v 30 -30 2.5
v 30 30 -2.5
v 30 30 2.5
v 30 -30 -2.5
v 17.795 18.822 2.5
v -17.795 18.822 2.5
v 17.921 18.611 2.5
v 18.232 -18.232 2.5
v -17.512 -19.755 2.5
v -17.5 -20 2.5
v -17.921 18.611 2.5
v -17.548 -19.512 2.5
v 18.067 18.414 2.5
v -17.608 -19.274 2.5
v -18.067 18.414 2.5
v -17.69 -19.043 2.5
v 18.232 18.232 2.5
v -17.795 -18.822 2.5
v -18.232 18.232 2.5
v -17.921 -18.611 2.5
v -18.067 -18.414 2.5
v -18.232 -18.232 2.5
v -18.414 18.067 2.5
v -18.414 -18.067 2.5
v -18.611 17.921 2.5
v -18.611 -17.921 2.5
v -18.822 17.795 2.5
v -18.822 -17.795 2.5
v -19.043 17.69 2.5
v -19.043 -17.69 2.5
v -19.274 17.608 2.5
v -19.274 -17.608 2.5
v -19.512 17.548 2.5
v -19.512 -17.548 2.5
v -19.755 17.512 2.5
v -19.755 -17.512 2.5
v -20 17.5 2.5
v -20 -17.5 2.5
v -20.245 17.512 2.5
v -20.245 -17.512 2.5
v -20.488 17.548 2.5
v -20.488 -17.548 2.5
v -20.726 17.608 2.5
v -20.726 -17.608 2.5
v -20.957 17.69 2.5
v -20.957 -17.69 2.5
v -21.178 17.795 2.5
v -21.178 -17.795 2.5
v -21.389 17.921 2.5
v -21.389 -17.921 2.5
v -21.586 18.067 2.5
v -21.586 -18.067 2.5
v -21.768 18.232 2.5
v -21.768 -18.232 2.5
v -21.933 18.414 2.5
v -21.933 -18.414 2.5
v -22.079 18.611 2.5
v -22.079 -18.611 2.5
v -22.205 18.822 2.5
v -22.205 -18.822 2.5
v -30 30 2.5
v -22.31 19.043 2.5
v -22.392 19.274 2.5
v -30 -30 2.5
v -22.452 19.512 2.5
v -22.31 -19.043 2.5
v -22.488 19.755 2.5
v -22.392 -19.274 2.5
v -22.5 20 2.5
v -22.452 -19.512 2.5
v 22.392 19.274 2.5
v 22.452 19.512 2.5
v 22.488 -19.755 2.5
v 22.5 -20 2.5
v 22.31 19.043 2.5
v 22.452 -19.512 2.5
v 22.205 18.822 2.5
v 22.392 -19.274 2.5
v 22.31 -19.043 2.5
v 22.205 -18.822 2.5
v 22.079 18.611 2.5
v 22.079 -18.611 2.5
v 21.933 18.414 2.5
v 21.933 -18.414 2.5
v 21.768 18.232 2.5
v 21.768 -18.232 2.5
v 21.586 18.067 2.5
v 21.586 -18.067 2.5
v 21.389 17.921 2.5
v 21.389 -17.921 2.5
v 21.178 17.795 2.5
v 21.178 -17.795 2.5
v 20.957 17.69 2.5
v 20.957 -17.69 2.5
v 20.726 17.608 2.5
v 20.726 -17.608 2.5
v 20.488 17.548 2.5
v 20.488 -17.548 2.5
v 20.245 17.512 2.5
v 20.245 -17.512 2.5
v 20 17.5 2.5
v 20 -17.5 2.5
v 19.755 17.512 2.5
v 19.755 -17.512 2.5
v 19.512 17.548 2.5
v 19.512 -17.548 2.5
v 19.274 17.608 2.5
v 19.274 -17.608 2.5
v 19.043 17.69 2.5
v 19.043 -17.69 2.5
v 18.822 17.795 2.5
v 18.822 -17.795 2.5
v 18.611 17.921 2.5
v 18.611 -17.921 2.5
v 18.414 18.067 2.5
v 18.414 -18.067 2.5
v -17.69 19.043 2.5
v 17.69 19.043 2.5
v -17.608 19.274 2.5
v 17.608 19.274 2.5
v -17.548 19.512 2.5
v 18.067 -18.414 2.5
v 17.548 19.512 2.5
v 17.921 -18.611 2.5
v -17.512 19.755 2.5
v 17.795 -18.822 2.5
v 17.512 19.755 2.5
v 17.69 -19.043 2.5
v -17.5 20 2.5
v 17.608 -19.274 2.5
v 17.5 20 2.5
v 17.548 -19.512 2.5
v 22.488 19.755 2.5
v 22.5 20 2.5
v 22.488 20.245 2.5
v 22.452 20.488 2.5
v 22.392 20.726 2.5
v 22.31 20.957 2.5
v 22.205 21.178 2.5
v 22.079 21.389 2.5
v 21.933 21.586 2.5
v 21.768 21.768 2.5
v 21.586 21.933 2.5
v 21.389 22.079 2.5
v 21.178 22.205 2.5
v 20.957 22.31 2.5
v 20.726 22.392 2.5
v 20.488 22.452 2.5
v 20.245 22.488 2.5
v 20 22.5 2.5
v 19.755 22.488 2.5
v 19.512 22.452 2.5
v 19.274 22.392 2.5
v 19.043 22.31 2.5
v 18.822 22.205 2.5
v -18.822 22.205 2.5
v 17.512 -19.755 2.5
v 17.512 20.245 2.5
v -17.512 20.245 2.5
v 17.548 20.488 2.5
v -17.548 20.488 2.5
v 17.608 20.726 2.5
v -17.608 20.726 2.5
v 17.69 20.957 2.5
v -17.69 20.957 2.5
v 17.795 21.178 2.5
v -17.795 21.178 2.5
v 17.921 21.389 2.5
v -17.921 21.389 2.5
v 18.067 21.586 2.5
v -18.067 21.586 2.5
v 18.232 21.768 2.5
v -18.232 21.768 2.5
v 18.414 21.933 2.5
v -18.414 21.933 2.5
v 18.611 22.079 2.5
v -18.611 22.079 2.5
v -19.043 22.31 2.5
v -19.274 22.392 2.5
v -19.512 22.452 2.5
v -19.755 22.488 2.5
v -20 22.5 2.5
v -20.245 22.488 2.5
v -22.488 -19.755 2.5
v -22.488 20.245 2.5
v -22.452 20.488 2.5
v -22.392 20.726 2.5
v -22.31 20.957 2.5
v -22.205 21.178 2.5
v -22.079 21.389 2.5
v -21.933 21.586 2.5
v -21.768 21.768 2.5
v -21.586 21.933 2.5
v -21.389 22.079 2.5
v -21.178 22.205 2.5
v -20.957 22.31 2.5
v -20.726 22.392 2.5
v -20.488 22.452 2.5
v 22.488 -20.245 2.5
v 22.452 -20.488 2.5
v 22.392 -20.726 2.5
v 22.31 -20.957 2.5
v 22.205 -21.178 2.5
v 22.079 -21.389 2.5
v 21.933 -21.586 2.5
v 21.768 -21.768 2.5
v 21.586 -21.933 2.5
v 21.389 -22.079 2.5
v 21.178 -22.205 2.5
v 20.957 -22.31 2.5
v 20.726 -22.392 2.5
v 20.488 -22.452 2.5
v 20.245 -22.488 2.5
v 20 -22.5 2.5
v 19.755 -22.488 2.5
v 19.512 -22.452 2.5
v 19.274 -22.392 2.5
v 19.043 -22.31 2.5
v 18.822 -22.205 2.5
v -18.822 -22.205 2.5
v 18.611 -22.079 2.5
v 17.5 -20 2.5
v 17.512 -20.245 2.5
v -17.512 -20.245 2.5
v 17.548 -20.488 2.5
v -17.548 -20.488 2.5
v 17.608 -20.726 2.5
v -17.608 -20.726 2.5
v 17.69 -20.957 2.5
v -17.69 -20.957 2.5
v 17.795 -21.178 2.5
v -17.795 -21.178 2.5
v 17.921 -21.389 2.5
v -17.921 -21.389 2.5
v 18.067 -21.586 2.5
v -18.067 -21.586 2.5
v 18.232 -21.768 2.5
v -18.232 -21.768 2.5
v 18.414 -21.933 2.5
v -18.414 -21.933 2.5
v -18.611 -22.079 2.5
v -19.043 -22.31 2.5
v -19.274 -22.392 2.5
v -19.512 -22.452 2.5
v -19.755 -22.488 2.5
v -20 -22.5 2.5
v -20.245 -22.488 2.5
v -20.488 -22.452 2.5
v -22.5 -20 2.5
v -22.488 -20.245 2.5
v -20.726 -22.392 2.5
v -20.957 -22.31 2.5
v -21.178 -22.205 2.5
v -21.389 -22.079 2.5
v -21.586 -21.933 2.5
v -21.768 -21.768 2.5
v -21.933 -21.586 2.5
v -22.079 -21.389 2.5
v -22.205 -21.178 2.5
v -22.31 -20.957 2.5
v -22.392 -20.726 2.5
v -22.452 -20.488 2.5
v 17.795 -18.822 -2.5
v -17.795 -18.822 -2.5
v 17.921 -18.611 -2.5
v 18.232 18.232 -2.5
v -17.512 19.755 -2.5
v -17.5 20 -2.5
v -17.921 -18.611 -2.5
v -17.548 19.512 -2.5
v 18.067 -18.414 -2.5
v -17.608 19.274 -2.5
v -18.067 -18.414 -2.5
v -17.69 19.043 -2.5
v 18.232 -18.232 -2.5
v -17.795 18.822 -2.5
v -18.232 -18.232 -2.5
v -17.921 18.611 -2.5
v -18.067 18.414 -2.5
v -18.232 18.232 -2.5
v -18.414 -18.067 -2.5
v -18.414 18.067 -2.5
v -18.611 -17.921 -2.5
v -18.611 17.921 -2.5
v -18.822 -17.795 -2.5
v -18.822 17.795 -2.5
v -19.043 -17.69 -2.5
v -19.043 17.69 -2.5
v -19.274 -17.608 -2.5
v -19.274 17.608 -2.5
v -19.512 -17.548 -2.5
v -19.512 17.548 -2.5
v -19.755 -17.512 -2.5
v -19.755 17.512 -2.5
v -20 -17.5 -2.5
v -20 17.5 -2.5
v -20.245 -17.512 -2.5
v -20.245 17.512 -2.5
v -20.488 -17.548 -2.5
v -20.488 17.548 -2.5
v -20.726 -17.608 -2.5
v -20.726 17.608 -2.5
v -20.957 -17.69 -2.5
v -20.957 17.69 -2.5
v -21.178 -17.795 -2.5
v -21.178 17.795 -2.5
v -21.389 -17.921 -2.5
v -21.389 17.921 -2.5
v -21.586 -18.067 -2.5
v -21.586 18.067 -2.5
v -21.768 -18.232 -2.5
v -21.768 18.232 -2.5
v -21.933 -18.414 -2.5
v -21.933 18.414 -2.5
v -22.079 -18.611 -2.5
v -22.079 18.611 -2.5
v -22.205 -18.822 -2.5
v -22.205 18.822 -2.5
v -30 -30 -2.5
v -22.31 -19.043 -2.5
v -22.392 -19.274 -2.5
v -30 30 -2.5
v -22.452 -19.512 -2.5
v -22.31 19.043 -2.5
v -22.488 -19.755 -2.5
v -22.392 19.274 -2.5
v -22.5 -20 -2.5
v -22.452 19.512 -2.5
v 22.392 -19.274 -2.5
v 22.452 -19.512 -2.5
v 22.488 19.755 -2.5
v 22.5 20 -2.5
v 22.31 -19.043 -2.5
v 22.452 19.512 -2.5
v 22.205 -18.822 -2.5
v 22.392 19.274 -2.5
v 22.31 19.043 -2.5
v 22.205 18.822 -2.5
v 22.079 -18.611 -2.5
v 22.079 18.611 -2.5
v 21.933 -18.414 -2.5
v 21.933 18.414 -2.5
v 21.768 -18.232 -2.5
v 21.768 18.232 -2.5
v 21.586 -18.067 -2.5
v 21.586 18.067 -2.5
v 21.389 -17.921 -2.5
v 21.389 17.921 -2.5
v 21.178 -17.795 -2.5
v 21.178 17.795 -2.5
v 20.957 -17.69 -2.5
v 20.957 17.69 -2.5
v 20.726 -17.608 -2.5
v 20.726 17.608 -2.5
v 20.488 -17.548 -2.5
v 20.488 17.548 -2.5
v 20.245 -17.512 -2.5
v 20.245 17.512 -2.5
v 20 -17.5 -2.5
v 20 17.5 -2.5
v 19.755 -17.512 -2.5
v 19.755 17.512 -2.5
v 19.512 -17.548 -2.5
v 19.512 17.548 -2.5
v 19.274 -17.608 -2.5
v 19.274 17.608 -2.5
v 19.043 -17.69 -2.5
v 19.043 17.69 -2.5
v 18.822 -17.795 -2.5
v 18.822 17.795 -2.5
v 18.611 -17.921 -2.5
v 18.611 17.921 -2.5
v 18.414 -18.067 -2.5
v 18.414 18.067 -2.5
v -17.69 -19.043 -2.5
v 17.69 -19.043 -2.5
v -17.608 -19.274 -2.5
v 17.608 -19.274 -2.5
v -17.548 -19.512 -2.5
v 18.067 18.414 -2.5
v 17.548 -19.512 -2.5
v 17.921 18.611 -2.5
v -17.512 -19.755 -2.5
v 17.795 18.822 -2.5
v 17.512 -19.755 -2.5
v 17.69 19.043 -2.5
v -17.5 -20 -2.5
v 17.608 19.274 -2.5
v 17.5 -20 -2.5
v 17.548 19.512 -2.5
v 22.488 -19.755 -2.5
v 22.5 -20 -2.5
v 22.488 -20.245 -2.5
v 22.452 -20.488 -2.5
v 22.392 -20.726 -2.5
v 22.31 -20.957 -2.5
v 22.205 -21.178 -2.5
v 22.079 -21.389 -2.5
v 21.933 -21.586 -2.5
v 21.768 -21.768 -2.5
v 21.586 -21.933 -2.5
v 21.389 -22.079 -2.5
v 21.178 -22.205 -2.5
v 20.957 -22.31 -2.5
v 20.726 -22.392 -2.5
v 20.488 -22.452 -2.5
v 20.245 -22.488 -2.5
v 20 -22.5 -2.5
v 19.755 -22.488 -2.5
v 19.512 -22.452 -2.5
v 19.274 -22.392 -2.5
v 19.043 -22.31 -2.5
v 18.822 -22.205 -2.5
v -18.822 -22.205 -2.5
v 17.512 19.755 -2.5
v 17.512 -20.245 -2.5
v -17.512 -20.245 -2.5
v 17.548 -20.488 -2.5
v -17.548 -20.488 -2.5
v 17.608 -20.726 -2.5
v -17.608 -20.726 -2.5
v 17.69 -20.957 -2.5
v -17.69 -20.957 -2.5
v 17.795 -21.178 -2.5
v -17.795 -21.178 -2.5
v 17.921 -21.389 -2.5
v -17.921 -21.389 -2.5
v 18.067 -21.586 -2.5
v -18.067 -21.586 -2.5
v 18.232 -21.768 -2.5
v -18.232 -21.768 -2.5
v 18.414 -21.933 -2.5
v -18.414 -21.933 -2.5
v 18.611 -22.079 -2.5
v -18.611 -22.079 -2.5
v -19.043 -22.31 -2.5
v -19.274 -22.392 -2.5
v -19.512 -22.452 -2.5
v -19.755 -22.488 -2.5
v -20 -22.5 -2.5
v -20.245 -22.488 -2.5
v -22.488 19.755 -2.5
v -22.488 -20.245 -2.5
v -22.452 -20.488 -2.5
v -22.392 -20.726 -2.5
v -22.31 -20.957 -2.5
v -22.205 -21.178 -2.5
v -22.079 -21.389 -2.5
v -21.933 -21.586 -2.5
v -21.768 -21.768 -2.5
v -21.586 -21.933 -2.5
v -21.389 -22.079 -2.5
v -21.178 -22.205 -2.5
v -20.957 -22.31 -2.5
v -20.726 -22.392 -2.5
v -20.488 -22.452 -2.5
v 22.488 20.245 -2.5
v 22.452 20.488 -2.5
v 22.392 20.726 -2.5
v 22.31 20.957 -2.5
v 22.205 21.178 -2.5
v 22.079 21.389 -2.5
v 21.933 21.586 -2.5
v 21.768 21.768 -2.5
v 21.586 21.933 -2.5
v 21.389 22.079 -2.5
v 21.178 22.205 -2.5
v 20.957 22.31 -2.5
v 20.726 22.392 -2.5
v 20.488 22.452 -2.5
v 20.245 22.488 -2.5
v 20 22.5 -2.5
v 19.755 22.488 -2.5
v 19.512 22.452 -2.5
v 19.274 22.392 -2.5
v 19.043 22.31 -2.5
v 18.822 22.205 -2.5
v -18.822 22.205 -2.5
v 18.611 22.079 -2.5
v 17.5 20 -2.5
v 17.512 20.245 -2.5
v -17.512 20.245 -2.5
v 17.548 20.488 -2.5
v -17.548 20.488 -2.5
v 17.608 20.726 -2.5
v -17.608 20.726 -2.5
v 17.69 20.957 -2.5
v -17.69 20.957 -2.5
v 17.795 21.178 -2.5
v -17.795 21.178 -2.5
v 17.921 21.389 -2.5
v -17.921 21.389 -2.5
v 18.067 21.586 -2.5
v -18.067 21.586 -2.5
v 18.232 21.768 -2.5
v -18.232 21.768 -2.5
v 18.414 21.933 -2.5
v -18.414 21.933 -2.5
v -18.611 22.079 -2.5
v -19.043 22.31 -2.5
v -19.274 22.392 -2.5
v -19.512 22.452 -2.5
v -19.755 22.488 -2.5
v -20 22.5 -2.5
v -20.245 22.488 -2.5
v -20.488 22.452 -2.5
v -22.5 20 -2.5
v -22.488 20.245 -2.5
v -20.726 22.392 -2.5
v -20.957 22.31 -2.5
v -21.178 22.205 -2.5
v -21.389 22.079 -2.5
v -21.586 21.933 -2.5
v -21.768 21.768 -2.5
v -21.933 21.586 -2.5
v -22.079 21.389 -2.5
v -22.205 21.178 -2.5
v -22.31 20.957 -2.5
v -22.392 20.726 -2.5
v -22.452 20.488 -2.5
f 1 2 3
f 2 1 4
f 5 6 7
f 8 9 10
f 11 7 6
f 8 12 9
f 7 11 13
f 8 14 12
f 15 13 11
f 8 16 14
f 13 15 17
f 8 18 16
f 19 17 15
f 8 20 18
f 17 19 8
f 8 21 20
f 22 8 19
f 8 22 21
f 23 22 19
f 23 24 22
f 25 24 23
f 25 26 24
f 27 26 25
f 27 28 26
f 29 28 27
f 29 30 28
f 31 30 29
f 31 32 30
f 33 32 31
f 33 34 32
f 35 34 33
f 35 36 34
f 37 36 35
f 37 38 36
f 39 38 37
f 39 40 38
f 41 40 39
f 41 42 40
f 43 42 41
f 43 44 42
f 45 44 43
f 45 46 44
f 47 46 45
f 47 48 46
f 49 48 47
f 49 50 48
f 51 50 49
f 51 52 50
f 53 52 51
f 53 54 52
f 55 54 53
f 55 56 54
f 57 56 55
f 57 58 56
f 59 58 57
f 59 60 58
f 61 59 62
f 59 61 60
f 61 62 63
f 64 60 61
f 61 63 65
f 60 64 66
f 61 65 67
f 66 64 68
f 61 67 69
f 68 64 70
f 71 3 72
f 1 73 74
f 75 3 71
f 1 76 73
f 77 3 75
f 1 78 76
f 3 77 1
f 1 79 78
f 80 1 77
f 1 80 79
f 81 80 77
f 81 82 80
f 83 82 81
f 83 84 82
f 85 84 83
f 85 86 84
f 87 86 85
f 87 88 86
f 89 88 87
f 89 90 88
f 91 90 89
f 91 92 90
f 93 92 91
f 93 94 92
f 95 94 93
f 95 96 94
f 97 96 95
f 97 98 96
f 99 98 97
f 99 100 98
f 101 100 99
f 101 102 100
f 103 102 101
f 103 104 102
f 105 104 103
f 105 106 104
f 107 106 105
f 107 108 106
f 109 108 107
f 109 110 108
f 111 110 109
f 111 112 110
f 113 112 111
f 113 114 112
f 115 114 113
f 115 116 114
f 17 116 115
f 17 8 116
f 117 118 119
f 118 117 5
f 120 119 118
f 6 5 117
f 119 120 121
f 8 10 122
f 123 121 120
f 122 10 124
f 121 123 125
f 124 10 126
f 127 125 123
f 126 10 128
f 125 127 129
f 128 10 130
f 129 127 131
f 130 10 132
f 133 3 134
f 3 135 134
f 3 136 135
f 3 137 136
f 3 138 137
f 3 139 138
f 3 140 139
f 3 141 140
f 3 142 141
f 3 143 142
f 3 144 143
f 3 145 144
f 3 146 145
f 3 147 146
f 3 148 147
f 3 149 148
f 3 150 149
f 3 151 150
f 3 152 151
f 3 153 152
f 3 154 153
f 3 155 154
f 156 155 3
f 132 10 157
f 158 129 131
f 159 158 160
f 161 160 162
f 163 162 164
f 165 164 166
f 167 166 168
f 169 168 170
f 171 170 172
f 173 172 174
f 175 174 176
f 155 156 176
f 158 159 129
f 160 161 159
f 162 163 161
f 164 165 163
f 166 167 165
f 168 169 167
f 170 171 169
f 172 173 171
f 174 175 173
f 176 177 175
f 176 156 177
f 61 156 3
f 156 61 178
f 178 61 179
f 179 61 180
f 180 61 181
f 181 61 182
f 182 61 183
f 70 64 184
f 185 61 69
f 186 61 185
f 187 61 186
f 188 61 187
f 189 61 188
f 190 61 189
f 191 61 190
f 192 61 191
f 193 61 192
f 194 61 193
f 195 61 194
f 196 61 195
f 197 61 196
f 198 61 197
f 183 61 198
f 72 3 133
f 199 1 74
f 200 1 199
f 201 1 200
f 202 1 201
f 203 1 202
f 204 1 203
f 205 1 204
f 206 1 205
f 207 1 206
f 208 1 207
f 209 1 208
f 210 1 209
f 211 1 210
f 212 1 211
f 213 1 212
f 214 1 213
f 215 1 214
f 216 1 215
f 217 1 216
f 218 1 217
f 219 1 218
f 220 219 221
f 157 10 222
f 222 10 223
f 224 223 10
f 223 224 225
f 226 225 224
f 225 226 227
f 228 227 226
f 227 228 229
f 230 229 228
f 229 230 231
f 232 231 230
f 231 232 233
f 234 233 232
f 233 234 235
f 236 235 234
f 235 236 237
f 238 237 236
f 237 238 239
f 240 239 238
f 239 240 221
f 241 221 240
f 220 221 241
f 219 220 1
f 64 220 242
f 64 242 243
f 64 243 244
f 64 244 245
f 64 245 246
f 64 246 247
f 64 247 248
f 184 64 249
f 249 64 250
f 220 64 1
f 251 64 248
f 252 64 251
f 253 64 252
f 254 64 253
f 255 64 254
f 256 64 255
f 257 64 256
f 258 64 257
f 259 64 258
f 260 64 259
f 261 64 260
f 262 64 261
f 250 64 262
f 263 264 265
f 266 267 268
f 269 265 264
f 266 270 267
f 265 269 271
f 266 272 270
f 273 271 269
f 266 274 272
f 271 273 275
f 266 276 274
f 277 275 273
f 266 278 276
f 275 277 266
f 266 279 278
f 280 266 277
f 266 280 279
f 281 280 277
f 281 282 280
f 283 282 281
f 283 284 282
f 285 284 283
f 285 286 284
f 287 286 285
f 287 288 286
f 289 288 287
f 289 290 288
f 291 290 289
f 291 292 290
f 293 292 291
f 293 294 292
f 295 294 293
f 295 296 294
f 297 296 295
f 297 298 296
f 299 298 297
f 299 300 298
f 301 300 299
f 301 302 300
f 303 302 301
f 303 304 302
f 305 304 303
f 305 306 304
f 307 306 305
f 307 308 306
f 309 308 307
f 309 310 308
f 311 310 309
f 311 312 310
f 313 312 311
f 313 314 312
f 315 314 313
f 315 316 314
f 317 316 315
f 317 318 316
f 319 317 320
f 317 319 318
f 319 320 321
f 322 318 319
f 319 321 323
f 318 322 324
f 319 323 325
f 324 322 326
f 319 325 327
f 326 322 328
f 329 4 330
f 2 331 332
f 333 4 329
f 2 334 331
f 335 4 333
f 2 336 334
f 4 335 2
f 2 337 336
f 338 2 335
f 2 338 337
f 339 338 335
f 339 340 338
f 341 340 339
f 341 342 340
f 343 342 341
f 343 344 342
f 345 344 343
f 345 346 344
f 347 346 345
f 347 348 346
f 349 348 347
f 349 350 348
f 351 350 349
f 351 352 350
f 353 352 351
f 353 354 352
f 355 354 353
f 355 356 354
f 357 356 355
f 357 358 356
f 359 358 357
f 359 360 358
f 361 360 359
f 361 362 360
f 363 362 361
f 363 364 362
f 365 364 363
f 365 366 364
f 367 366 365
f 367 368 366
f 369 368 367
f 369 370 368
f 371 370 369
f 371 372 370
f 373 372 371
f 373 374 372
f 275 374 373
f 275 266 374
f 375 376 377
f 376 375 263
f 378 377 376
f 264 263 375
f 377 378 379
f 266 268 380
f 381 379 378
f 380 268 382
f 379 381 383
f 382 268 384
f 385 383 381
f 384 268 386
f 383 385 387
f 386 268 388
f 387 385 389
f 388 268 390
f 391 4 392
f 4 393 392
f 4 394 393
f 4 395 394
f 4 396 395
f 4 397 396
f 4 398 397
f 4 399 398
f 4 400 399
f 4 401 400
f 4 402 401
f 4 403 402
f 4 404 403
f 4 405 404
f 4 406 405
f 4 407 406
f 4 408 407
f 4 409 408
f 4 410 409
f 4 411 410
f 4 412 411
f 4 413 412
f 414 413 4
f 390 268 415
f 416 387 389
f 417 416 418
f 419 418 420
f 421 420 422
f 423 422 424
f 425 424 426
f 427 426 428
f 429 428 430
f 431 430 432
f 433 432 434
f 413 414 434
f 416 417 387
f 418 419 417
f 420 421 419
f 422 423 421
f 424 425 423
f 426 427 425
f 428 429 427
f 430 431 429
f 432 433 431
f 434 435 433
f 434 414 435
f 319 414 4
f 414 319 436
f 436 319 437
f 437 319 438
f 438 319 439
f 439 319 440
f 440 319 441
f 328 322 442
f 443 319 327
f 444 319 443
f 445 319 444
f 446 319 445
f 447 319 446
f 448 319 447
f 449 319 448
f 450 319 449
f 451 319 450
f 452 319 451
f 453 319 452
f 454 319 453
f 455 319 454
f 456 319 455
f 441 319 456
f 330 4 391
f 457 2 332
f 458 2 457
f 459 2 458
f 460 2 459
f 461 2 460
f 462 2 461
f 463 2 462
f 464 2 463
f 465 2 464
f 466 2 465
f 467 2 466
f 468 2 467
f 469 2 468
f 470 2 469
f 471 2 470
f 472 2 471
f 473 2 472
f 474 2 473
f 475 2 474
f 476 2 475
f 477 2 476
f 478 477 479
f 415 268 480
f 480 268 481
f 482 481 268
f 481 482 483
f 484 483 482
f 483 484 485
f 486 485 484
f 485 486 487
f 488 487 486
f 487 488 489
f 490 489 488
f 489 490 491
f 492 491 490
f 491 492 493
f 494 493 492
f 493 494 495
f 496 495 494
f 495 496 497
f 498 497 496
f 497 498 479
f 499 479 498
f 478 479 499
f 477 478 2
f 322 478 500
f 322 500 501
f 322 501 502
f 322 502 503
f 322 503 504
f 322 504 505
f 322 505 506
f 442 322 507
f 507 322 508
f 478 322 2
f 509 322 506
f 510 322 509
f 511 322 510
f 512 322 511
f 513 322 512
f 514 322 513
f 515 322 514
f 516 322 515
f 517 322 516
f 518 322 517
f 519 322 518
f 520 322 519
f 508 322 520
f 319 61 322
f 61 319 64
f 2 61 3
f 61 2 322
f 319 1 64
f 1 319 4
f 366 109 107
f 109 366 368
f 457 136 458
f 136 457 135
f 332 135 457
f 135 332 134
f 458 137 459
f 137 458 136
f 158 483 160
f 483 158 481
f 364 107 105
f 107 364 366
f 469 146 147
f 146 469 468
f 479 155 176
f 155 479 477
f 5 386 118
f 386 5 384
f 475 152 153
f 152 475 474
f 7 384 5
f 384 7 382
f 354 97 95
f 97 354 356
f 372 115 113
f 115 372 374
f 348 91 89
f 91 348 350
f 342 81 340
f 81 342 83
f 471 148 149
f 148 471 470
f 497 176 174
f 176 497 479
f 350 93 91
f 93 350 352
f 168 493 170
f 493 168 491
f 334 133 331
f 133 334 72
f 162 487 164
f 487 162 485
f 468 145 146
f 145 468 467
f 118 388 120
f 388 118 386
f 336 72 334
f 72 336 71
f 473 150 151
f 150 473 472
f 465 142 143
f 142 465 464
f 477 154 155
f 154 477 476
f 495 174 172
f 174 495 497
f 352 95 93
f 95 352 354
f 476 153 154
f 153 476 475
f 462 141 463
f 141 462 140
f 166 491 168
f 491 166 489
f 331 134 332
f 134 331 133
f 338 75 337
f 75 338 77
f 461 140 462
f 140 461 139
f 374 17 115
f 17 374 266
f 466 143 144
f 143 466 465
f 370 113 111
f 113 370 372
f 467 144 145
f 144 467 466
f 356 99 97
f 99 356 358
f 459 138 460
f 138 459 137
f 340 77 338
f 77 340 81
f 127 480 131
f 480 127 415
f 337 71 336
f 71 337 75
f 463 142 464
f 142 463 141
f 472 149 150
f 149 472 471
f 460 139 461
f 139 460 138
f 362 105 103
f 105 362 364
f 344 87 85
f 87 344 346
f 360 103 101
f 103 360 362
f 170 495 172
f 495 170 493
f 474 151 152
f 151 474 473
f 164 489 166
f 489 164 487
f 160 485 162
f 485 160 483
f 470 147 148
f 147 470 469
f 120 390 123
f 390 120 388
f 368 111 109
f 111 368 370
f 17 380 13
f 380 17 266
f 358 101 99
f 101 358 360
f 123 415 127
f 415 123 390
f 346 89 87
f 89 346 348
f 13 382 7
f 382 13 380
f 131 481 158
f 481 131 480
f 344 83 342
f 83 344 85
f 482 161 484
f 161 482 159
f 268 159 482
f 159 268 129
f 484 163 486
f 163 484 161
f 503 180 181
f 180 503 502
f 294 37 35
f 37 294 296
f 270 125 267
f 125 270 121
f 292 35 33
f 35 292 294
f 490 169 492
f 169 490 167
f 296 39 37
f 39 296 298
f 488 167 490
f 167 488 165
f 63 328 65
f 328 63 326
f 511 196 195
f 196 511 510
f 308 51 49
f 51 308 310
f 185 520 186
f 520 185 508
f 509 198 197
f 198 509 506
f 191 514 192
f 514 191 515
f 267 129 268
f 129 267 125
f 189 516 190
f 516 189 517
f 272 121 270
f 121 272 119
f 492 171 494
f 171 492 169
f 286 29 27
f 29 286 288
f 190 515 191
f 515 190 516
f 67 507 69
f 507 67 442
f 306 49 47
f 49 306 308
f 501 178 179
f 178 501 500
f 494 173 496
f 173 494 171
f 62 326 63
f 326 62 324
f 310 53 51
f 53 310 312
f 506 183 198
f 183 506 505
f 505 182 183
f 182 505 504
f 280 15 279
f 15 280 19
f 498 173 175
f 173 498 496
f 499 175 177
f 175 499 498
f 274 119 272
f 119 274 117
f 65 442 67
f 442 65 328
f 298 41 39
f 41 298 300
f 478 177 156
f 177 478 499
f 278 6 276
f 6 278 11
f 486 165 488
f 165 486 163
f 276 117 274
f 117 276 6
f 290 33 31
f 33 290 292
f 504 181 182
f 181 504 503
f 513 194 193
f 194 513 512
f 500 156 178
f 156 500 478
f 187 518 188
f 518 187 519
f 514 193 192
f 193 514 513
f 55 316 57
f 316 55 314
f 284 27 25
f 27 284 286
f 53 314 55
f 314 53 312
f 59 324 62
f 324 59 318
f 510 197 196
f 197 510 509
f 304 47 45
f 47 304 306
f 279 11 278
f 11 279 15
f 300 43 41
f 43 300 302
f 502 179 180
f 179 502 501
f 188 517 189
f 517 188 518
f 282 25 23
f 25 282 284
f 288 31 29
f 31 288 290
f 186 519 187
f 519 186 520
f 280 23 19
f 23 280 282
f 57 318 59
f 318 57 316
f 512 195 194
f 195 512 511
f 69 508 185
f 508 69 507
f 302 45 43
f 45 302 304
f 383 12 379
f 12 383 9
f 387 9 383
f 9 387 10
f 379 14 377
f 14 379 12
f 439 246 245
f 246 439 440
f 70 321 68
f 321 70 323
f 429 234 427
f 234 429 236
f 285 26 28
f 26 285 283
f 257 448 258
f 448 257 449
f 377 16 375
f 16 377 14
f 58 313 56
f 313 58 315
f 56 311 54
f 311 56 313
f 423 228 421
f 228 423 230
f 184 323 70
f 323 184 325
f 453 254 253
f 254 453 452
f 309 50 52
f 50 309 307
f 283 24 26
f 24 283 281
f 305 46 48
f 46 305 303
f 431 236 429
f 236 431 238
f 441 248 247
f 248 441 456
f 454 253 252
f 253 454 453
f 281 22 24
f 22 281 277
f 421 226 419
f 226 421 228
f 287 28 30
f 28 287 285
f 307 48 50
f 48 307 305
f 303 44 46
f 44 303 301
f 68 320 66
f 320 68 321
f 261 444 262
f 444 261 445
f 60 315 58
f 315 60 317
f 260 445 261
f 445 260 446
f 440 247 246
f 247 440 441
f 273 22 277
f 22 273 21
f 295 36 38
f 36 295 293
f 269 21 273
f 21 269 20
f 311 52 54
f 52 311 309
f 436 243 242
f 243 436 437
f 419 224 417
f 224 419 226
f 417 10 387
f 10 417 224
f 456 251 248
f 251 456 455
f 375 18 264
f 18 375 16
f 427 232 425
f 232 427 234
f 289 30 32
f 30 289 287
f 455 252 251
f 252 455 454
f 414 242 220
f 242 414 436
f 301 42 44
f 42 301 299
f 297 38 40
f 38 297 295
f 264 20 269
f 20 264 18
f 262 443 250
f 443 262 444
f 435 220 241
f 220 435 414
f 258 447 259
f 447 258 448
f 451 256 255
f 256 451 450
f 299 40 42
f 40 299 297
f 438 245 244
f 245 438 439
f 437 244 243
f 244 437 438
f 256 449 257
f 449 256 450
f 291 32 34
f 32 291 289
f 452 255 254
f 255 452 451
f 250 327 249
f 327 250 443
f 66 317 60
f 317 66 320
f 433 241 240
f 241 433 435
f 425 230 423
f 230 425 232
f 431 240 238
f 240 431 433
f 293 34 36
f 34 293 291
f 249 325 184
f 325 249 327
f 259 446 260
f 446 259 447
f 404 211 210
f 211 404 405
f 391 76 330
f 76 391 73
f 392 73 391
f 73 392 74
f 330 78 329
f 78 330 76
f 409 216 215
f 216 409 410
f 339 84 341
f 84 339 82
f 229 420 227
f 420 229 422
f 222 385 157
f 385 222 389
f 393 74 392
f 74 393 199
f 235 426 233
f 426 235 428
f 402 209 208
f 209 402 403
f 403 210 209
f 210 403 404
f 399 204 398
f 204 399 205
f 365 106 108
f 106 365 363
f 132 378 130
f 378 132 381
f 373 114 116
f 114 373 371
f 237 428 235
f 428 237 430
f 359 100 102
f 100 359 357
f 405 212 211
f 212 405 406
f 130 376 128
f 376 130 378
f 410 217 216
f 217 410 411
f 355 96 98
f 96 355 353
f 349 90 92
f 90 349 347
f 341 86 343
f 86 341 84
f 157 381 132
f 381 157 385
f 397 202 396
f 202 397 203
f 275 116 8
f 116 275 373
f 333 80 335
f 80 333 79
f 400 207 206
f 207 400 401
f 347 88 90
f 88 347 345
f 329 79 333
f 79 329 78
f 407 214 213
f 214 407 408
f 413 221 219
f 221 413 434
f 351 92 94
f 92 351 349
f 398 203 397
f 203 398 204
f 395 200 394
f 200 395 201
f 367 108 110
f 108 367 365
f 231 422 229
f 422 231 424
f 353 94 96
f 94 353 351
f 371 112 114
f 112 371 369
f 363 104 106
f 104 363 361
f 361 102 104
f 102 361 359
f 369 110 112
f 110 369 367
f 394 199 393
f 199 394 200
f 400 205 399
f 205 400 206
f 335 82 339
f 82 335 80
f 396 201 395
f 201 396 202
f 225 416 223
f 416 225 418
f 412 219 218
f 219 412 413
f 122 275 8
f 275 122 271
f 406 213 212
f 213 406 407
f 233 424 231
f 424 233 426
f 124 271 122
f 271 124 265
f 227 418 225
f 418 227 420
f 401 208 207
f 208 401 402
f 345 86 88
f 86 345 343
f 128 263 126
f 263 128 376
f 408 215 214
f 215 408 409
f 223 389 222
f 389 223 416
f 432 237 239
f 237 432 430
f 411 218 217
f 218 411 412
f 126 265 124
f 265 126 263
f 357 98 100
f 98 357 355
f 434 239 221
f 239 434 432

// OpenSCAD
// A plate with a four-hole bolt pattern on a 40 mm square.

plate_x = 60;
plate_y = 60;
plate_z = 5;
hole_d  = 5;
pitch   = 40;
$fn = 64;

h = pitch / 2;

difference() {
    cube([plate_x, plate_y, plate_z], center = true);
    translate([ h,  h, 0]) cylinder(h = plate_z + 2, d = hole_d, center = true);
    translate([-h,  h, 0]) cylinder(h = plate_z + 2, d = hole_d, center = true);
    translate([-h, -h, 0]) cylinder(h = plate_z + 2, d = hole_d, center = true);
    translate([ h, -h, 0]) cylinder(h = plate_z + 2, d = hole_d, center = true);
}
